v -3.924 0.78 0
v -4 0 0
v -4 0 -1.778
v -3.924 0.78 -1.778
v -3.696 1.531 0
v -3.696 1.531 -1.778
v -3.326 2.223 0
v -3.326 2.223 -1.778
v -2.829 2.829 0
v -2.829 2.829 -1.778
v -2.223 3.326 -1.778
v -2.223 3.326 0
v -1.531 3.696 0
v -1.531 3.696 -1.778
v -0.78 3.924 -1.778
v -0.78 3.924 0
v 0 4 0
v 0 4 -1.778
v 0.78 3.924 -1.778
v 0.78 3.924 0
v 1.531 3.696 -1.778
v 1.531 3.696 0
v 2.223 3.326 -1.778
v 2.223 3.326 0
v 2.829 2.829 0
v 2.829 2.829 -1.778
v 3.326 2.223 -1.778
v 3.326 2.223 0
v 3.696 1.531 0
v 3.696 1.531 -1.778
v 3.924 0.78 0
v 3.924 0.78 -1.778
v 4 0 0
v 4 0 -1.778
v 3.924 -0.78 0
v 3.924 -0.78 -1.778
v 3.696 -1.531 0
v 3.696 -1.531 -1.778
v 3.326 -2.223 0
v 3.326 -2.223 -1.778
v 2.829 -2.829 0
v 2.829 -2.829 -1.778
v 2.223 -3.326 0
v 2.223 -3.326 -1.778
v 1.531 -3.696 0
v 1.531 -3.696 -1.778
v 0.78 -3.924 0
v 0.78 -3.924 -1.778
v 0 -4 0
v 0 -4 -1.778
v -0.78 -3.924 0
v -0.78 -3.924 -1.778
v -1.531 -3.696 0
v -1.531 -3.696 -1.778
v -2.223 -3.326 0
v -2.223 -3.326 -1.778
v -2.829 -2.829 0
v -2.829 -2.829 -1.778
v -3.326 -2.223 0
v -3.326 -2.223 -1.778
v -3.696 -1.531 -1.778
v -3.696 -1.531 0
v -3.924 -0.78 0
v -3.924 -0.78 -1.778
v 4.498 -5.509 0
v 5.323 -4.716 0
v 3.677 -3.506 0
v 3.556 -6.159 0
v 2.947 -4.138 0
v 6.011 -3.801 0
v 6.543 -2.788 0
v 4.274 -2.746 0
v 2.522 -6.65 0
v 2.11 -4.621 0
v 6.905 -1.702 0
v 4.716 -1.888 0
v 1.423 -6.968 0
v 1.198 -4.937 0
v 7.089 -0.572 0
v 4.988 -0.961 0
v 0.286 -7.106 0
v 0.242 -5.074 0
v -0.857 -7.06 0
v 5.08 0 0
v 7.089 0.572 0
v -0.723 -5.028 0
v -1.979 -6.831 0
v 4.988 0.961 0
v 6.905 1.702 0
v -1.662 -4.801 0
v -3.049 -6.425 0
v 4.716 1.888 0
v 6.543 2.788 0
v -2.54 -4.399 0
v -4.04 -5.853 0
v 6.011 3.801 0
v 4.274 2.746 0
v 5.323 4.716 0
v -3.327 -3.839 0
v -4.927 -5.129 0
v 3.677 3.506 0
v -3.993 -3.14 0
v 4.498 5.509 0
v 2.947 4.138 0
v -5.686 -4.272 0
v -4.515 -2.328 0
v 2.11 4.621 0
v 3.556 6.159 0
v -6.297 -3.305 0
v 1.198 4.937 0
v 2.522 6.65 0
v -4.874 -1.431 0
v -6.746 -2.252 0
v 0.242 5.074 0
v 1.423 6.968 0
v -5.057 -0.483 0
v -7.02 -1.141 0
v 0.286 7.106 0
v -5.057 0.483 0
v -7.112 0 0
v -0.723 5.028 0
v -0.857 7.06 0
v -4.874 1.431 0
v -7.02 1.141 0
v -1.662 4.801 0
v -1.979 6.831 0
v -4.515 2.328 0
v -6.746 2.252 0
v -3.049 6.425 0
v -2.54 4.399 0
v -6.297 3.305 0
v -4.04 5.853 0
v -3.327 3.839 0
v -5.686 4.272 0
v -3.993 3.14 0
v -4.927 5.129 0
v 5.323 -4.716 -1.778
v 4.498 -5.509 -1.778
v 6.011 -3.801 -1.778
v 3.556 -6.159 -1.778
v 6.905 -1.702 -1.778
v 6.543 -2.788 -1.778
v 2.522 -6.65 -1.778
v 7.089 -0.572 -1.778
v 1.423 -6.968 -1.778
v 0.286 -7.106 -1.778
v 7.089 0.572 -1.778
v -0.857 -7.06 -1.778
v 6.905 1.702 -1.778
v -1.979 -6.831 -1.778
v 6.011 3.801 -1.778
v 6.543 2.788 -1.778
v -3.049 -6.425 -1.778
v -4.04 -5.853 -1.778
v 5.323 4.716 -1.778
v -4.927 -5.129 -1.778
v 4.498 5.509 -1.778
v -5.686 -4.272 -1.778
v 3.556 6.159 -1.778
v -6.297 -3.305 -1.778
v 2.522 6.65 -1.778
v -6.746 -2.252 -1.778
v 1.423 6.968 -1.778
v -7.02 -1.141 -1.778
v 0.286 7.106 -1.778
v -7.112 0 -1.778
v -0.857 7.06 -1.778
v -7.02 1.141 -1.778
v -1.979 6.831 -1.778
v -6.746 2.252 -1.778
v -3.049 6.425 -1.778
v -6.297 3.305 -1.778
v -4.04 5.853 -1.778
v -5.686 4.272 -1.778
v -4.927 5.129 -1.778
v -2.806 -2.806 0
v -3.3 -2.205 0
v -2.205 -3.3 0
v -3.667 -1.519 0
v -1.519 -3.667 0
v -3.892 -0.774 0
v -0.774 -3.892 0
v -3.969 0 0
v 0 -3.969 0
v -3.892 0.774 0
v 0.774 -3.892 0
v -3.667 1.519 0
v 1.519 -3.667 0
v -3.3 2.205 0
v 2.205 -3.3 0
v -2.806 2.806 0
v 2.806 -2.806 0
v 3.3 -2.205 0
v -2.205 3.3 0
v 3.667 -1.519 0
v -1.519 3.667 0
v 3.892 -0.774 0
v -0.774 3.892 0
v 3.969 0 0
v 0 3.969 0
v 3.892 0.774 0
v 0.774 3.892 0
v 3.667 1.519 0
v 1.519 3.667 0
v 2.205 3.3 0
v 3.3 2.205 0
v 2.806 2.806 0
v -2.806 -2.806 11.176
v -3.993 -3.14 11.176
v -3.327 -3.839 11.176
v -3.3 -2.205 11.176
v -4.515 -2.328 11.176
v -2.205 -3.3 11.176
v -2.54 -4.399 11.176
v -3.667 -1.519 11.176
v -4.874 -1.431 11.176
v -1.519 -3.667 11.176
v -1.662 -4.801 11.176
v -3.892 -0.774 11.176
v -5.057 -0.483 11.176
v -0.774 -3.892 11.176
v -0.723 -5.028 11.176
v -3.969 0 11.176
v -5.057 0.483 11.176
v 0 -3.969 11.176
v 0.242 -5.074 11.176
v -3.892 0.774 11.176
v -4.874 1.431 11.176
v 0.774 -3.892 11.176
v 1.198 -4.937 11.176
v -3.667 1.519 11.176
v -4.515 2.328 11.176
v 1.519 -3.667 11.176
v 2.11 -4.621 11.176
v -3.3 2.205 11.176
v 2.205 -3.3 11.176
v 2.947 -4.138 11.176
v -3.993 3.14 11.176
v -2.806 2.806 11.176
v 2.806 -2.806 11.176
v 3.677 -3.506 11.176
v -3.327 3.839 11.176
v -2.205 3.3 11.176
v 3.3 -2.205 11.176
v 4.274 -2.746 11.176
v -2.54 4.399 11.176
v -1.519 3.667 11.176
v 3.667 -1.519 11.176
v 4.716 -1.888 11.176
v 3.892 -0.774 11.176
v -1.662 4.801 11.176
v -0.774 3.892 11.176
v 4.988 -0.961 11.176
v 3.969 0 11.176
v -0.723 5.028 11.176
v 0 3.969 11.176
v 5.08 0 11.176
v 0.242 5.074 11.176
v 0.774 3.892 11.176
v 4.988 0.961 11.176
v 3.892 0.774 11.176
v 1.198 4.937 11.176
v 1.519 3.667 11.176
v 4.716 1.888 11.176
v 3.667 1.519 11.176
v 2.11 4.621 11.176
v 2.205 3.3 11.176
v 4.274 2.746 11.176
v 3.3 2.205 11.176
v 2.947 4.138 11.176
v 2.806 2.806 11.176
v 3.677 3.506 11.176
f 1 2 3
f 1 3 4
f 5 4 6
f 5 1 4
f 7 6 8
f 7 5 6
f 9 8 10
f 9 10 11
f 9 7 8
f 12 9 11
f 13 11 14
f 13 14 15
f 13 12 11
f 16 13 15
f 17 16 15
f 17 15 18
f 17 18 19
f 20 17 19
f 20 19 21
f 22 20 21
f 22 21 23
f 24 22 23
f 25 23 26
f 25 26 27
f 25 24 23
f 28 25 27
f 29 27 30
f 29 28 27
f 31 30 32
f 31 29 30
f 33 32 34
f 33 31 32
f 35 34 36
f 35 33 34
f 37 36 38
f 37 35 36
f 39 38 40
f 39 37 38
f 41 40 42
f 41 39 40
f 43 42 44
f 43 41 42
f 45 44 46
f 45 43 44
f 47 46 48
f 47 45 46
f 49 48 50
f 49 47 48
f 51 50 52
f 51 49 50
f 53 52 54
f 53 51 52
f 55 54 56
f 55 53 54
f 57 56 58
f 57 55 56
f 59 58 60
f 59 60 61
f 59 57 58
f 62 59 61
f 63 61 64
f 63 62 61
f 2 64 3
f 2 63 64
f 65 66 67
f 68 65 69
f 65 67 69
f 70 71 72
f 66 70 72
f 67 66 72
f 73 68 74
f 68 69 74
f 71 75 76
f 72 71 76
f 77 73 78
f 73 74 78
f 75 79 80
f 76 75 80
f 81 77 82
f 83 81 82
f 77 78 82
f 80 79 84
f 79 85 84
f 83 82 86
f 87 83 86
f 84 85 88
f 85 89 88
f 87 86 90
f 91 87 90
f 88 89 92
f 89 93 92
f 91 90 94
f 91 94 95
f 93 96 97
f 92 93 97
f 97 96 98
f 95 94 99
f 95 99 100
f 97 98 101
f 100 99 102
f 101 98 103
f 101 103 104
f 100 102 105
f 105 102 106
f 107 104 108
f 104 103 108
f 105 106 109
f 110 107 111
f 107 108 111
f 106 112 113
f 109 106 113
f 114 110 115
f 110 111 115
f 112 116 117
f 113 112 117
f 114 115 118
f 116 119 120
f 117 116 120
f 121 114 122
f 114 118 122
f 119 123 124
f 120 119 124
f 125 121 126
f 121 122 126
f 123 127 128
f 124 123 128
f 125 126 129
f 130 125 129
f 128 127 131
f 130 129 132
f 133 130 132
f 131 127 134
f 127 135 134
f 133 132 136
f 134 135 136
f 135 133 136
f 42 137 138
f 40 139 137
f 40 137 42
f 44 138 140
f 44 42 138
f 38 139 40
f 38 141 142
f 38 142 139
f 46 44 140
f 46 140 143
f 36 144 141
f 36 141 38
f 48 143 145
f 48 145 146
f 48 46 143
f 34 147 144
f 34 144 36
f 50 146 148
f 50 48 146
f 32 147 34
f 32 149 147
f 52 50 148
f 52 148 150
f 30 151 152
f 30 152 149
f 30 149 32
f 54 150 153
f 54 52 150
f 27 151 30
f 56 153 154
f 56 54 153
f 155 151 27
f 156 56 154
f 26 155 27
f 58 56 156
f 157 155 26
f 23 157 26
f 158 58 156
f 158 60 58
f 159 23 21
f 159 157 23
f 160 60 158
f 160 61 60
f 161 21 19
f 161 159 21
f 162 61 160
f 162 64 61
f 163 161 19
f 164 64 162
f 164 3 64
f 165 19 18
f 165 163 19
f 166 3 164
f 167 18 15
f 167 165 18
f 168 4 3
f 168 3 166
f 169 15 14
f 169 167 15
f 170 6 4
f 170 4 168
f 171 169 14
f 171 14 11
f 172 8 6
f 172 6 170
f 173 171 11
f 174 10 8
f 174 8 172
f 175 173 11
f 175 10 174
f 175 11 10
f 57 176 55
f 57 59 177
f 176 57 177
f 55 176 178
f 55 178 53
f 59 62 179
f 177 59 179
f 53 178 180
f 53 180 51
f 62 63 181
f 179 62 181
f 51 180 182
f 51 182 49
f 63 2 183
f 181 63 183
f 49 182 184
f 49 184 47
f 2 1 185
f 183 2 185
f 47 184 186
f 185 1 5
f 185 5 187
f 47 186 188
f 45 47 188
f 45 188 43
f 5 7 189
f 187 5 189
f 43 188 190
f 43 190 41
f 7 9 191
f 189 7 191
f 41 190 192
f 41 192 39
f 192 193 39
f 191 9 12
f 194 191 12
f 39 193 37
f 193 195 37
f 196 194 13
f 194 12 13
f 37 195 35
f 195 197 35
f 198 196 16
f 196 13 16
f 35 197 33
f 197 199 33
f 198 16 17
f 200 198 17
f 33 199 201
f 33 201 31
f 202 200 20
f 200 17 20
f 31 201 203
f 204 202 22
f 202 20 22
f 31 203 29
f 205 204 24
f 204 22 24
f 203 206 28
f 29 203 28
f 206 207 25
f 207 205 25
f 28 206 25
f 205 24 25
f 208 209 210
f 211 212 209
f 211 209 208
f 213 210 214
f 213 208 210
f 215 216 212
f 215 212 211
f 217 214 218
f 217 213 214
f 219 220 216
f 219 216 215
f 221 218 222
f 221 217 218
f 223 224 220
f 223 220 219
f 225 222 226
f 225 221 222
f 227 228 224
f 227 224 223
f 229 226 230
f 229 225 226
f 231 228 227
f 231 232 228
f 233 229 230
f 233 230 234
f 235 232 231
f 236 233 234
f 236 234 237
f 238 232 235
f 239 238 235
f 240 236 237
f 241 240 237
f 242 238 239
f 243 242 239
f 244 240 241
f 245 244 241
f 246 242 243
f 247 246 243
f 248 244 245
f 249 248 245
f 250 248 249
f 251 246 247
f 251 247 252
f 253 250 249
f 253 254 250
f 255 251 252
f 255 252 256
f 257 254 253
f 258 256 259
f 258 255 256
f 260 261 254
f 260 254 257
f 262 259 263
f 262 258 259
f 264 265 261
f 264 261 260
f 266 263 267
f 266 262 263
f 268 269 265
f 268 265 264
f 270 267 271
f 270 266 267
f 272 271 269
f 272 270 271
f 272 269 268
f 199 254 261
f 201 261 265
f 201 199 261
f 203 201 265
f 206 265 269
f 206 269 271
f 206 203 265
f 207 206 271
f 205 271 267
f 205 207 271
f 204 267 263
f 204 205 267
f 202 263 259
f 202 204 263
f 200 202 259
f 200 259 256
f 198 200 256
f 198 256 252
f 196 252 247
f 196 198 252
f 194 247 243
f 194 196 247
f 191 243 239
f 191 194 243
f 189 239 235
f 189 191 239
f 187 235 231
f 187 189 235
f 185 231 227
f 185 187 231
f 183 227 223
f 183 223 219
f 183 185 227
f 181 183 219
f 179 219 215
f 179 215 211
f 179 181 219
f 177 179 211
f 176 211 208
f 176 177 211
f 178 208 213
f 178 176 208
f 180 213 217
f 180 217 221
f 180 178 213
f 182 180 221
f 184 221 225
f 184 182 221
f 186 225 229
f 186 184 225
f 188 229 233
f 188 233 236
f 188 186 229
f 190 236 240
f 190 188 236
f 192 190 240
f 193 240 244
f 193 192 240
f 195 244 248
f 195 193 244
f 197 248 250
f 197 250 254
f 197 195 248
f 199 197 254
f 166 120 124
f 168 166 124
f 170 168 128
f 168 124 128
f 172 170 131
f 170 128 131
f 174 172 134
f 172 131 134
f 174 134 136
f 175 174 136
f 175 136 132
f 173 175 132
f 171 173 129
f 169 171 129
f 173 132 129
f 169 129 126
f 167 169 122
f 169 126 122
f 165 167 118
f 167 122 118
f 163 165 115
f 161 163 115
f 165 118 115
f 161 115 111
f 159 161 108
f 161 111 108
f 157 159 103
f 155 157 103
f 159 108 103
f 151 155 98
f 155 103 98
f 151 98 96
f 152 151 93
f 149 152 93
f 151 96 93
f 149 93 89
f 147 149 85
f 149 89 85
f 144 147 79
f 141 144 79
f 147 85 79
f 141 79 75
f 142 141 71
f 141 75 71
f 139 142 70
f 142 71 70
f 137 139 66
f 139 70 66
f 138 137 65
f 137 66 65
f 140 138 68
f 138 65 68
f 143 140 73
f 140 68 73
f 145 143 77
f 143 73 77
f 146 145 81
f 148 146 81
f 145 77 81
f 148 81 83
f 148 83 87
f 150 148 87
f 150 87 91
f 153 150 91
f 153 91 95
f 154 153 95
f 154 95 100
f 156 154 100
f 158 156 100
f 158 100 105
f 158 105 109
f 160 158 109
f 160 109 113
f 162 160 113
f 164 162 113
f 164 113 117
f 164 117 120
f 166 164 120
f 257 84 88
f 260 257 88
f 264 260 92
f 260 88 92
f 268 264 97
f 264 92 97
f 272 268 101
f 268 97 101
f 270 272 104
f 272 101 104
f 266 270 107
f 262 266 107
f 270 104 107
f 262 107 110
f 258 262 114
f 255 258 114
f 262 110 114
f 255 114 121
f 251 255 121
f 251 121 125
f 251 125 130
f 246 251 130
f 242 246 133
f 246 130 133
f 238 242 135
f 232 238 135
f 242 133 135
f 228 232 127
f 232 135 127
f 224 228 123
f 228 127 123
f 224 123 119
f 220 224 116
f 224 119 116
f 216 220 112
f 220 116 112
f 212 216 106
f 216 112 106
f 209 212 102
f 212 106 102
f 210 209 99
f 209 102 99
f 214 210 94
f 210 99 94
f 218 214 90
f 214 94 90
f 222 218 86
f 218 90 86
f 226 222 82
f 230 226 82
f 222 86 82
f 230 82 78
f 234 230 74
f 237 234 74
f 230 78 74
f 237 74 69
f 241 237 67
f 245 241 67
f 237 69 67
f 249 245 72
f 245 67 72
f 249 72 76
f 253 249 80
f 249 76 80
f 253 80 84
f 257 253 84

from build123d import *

# Parameters (mm, degrees)
SKETCH1_R      = 5.08
SKETCH1_R_2    = 3.96875
EXTRUDE1_DEPTH = 11.176
SKETCH2_R      = 7.112
SKETCH2_R_2    = 4.0005
EXTRUDE2_DEPTH = 1.778


with BuildPart() as part:
    # Sketch1 → Extrude1 (new body)
    with BuildSketch(Plane.XY):
        Circle(SKETCH1_R)
        Circle(SKETCH1_R_2, mode=Mode.SUBTRACT)
    extrude(amount=EXTRUDE1_DEPTH)

    # Sketch2 → Extrude2 (add)
    with BuildSketch(Plane(origin=(0, 0, 0), x_dir=(-1, 0, 0), z_dir=(0, 0, -1))):
        Circle(SKETCH2_R)
        Circle(SKETCH2_R_2, mode=Mode.SUBTRACT)
    extrude(amount=EXTRUDE2_DEPTH)


solid = part.part
